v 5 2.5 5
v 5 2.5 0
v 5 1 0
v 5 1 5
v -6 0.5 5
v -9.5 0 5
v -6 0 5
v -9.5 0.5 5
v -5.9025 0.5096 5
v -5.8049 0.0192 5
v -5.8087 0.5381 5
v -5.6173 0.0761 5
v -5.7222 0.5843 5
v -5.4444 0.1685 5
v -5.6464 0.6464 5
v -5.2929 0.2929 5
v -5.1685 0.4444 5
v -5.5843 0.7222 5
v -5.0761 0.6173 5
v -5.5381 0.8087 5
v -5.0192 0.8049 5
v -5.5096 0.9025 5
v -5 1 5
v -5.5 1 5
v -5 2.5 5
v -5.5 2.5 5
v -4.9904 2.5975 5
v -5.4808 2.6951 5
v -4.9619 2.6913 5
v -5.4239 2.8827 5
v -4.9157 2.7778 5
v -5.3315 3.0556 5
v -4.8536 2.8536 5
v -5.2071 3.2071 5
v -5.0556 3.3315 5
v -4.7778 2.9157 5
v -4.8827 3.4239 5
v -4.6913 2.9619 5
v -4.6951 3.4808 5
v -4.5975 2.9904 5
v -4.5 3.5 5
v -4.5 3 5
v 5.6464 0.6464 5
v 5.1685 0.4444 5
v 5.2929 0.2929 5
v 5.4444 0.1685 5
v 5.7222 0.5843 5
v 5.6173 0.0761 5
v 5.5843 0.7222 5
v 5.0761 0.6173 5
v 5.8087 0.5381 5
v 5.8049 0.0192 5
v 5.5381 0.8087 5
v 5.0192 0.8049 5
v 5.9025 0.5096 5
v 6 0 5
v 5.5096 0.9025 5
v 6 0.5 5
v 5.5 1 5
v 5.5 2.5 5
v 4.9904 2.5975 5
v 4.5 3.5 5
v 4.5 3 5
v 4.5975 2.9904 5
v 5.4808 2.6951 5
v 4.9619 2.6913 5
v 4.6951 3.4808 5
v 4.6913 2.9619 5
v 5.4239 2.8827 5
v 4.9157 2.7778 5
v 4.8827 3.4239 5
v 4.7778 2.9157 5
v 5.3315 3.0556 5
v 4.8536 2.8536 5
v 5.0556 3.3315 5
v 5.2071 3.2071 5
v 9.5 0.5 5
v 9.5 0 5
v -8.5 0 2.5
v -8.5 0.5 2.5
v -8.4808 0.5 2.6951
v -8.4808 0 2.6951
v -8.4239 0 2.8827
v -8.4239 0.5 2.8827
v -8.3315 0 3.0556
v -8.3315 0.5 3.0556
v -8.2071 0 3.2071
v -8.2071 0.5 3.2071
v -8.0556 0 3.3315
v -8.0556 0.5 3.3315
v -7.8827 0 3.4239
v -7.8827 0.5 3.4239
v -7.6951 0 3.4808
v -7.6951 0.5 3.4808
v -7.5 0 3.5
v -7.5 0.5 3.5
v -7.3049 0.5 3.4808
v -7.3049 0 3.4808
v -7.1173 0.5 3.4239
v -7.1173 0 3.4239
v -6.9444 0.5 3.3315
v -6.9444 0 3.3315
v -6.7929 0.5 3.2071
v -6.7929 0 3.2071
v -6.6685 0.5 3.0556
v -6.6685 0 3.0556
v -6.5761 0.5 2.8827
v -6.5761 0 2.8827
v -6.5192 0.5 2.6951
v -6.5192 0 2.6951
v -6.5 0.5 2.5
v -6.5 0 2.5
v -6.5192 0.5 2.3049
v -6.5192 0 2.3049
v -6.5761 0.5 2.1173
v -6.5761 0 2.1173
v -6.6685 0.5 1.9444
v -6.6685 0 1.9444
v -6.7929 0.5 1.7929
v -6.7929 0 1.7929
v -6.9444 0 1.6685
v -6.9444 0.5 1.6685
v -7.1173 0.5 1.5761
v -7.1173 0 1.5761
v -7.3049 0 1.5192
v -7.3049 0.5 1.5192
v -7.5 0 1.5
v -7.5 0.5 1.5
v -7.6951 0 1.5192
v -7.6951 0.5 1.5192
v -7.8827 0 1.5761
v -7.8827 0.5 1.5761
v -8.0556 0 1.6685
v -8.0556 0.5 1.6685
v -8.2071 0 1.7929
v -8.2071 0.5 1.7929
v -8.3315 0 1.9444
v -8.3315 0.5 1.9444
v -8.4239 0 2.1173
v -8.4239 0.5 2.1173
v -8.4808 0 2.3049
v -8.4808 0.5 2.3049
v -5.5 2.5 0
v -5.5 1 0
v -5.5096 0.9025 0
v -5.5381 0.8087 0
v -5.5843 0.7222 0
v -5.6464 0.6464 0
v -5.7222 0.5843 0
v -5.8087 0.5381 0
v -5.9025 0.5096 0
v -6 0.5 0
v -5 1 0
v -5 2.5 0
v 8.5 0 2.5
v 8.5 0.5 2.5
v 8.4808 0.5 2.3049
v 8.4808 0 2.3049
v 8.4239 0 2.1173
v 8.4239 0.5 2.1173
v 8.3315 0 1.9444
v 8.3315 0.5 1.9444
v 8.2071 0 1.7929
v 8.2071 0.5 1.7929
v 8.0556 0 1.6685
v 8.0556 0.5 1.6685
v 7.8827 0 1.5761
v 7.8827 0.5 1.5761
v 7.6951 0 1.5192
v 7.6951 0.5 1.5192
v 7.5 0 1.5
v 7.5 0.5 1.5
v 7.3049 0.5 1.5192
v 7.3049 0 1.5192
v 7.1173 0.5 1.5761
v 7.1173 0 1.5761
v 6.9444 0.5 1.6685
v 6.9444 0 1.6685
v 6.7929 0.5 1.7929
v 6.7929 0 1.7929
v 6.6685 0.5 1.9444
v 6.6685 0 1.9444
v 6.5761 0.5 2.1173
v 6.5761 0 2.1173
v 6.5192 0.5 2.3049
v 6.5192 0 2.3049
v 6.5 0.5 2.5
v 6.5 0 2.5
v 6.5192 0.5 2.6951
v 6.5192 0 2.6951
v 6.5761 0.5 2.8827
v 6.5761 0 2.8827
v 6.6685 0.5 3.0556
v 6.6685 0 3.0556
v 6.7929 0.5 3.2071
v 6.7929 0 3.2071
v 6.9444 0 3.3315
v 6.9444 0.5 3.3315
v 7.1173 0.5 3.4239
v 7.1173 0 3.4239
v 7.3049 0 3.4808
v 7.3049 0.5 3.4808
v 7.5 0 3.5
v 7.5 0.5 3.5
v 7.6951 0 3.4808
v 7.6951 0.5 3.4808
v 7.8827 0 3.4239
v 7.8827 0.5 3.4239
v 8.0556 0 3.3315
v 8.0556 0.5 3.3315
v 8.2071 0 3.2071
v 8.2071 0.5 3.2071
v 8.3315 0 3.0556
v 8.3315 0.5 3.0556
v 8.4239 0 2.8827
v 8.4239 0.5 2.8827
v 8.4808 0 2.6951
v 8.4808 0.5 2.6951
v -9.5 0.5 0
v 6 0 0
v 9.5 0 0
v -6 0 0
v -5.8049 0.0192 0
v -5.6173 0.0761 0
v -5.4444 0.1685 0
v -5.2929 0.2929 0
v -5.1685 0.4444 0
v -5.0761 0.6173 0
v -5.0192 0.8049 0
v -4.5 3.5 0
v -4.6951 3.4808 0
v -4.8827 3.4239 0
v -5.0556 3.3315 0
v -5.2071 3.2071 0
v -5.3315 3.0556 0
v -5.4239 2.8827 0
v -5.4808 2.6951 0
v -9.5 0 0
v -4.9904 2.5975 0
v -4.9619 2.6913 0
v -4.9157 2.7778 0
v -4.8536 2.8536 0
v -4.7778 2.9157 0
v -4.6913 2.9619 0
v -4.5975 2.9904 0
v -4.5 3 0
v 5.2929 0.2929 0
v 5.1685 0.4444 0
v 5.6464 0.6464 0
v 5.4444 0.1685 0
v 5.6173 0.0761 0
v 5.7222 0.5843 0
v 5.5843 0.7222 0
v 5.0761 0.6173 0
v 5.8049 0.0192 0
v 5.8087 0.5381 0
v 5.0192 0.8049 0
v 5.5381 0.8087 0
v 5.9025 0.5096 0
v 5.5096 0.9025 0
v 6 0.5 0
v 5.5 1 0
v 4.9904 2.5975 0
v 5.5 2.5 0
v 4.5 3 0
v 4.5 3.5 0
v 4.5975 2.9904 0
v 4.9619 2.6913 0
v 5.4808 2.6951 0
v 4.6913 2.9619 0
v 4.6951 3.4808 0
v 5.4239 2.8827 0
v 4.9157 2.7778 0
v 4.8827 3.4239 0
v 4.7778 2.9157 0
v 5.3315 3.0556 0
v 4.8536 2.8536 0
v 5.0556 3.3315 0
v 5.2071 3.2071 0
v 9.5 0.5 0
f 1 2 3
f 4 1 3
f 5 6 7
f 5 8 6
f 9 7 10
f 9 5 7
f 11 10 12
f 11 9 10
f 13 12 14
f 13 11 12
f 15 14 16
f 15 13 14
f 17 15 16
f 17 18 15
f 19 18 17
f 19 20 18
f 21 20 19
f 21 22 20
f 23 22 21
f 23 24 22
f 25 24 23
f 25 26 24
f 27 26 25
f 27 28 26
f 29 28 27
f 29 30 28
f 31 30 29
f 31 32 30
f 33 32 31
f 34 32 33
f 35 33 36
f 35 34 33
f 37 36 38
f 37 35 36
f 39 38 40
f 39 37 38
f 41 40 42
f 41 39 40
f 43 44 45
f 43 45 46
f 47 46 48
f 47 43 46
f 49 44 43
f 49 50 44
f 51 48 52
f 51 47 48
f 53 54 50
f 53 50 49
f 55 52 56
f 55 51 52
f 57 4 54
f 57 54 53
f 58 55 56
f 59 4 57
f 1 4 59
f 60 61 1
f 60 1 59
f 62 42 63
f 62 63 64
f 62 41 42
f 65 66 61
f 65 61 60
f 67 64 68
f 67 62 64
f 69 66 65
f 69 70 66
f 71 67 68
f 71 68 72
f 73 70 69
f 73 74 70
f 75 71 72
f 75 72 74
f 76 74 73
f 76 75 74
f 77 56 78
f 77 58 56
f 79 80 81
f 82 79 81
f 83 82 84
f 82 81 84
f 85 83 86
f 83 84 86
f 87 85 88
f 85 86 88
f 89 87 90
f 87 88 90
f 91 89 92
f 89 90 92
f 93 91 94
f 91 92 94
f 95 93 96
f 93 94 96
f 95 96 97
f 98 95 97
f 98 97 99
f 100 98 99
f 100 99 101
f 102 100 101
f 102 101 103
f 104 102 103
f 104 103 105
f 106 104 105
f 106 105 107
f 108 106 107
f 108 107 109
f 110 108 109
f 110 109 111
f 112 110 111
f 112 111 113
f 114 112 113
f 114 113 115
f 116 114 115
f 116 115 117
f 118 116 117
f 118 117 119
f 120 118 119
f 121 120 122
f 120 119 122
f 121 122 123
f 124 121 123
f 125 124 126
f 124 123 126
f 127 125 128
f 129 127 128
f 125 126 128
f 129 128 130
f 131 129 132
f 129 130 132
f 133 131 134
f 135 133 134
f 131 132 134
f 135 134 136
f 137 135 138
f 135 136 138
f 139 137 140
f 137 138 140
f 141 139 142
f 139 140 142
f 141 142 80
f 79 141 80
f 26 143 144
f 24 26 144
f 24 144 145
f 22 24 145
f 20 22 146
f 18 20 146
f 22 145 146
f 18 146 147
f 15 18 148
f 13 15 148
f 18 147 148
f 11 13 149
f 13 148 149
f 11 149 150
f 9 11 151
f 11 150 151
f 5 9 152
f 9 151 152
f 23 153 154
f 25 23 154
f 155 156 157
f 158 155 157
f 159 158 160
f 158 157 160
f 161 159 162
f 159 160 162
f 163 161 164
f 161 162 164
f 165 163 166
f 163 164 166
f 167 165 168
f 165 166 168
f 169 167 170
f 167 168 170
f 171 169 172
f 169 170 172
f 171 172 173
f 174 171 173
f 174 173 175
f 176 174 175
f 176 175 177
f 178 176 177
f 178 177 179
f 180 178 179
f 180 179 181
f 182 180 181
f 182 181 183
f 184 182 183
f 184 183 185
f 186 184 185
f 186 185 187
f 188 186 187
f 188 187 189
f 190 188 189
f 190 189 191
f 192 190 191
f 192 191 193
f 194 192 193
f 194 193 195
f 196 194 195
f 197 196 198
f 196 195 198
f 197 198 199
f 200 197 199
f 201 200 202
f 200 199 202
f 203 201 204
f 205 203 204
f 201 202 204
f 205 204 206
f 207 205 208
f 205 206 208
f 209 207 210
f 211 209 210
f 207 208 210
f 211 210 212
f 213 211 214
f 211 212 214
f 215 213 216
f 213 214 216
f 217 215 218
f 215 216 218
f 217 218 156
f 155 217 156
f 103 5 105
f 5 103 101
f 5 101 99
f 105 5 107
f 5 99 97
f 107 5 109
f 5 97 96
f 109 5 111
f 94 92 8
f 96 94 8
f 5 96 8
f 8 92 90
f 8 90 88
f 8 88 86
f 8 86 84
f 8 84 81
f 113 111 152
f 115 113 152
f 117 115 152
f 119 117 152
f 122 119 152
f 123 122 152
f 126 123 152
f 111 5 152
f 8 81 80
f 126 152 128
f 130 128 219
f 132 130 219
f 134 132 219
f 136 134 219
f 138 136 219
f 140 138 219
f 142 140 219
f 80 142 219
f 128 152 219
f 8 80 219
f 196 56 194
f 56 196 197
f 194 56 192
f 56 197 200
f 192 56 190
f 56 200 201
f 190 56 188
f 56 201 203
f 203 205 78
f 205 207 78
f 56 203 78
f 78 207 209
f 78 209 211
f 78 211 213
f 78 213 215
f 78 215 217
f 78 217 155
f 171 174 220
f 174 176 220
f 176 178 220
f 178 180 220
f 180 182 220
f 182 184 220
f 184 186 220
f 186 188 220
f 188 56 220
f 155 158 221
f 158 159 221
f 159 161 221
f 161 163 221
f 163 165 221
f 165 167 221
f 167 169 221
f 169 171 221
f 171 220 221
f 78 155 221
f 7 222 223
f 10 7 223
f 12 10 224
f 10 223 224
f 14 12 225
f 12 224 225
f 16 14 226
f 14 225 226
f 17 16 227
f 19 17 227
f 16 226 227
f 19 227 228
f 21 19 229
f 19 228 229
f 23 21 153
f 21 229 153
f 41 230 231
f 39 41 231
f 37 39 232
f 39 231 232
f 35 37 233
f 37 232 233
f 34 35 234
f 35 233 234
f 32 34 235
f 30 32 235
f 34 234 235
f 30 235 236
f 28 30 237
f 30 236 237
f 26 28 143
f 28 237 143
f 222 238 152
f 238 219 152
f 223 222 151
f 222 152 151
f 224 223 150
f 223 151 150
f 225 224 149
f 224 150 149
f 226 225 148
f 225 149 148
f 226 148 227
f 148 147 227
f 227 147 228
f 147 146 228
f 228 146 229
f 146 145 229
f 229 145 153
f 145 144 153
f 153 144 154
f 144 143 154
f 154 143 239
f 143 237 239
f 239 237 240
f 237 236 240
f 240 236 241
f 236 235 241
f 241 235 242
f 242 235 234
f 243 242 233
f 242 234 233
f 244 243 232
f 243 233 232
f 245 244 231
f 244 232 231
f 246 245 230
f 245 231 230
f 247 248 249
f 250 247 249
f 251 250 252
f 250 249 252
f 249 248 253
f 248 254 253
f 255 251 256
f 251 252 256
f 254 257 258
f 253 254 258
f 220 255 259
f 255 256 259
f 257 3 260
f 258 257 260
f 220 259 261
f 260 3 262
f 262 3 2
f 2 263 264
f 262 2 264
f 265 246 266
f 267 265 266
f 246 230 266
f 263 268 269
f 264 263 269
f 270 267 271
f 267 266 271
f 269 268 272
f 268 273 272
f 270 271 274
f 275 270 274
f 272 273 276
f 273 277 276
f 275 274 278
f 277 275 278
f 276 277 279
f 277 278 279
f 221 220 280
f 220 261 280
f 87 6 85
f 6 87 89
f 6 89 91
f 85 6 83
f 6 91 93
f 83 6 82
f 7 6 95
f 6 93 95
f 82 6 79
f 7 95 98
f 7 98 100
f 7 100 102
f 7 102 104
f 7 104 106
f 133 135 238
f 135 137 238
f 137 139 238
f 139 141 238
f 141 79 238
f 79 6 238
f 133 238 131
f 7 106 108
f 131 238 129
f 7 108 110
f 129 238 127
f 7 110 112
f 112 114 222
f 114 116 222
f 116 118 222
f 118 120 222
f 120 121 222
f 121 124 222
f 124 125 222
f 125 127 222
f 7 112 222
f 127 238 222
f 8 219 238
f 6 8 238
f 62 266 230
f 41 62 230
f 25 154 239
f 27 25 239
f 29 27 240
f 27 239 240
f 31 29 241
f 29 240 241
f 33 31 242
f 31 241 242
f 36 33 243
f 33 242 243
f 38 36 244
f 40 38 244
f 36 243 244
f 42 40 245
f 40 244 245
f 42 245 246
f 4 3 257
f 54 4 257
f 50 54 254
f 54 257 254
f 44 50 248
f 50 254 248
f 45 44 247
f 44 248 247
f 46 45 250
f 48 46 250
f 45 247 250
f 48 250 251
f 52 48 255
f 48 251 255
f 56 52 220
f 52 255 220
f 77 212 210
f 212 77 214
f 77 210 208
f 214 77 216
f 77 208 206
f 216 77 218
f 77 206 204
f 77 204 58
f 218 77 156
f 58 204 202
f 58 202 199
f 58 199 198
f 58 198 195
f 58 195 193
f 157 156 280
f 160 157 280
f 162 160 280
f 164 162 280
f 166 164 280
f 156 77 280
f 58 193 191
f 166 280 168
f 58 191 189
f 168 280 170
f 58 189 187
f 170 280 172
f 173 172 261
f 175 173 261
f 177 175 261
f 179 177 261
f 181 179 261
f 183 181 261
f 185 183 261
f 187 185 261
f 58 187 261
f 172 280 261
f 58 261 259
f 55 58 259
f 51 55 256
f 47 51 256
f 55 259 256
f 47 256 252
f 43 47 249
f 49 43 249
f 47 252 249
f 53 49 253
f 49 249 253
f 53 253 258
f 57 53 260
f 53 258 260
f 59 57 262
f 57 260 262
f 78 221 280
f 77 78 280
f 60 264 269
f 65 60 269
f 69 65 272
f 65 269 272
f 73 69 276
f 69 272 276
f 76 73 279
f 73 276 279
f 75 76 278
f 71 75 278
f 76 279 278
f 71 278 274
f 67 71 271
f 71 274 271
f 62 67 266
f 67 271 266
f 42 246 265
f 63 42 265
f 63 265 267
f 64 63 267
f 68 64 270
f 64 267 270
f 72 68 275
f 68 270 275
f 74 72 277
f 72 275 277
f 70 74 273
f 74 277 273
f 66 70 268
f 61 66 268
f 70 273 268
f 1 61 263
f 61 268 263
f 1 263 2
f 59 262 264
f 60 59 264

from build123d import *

# Parameters (mm, degrees)
BASE_FLANGE1_DEPTH = 5
SKETCH7_R          = 1
CUT_EXTRUDE1_DEPTH = 10


# Sheet-metal steps are written as plain solids
with BuildPart() as part:
    # Sketch2 → Base-Flange1 (new body)
    with BuildSketch(Plane.XY):
        with BuildLine():
            Line((-9.5, 0), (-6, 0))
            ThreePointArc((-6, 0), (-5.292893219, 0.292893219), (-5, 1))
            Line((-5, 1), (-5, 2.5))
            ThreePointArc((-5, 2.5), (-4.853553391, 2.853553391), (-4.5, 3))
            Line((-4.5, 3), (4.5, 3))
            ThreePointArc((4.5, 3), (4.853553391, 2.853553391), (5, 2.5))
            Line((5, 2.5), (5, 1))
            ThreePointArc((5, 1), (5.292893219, 0.292893219), (6, 0))
            Line((6, 0), (9.5, 0))
            Line((9.5, 0), (9.5, 0.5))
            Line((9.5, 0.5), (6, 0.5))
            ThreePointArc((6, 0.5), (5.646446609, 0.646446609), (5.5, 1))
            Line((5.5, 1), (5.5, 2.5))
            ThreePointArc((5.5, 2.5), (5.207106781, 3.207106781), (4.5, 3.5))
            Line((4.5, 3.5), (-4.5, 3.5))
            ThreePointArc((-4.5, 3.5), (-5.207106781, 3.207106781), (-5.5, 2.5))
            Line((-5.5, 2.5), (-5.5, 1))
            ThreePointArc((-5.5, 1), (-5.646446609, 0.646446609), (-6, 0.5))
            Line((-6, 0.5), (-9.5, 0.5))
            Line((-9.5, 0.5), (-9.5, 0))
        make_face()
    extrude(amount=BASE_FLANGE1_DEPTH)

    # Sketch7 → Cut-Extrude1 (cut)
    with BuildSketch(Plane(origin=(0, 0.5, 0), x_dir=(1, 0, 0), z_dir=(0, 1, 0))):
        with Locations(Location((-7.5, -2.5, 0), (0, 0, 180))):
            Circle(SKETCH7_R)
        with Locations((7.5, -2.5)):
            Circle(SKETCH7_R)
    extrude(amount=-CUT_EXTRUDE1_DEPTH, mode=Mode.SUBTRACT)


solid = part.part
